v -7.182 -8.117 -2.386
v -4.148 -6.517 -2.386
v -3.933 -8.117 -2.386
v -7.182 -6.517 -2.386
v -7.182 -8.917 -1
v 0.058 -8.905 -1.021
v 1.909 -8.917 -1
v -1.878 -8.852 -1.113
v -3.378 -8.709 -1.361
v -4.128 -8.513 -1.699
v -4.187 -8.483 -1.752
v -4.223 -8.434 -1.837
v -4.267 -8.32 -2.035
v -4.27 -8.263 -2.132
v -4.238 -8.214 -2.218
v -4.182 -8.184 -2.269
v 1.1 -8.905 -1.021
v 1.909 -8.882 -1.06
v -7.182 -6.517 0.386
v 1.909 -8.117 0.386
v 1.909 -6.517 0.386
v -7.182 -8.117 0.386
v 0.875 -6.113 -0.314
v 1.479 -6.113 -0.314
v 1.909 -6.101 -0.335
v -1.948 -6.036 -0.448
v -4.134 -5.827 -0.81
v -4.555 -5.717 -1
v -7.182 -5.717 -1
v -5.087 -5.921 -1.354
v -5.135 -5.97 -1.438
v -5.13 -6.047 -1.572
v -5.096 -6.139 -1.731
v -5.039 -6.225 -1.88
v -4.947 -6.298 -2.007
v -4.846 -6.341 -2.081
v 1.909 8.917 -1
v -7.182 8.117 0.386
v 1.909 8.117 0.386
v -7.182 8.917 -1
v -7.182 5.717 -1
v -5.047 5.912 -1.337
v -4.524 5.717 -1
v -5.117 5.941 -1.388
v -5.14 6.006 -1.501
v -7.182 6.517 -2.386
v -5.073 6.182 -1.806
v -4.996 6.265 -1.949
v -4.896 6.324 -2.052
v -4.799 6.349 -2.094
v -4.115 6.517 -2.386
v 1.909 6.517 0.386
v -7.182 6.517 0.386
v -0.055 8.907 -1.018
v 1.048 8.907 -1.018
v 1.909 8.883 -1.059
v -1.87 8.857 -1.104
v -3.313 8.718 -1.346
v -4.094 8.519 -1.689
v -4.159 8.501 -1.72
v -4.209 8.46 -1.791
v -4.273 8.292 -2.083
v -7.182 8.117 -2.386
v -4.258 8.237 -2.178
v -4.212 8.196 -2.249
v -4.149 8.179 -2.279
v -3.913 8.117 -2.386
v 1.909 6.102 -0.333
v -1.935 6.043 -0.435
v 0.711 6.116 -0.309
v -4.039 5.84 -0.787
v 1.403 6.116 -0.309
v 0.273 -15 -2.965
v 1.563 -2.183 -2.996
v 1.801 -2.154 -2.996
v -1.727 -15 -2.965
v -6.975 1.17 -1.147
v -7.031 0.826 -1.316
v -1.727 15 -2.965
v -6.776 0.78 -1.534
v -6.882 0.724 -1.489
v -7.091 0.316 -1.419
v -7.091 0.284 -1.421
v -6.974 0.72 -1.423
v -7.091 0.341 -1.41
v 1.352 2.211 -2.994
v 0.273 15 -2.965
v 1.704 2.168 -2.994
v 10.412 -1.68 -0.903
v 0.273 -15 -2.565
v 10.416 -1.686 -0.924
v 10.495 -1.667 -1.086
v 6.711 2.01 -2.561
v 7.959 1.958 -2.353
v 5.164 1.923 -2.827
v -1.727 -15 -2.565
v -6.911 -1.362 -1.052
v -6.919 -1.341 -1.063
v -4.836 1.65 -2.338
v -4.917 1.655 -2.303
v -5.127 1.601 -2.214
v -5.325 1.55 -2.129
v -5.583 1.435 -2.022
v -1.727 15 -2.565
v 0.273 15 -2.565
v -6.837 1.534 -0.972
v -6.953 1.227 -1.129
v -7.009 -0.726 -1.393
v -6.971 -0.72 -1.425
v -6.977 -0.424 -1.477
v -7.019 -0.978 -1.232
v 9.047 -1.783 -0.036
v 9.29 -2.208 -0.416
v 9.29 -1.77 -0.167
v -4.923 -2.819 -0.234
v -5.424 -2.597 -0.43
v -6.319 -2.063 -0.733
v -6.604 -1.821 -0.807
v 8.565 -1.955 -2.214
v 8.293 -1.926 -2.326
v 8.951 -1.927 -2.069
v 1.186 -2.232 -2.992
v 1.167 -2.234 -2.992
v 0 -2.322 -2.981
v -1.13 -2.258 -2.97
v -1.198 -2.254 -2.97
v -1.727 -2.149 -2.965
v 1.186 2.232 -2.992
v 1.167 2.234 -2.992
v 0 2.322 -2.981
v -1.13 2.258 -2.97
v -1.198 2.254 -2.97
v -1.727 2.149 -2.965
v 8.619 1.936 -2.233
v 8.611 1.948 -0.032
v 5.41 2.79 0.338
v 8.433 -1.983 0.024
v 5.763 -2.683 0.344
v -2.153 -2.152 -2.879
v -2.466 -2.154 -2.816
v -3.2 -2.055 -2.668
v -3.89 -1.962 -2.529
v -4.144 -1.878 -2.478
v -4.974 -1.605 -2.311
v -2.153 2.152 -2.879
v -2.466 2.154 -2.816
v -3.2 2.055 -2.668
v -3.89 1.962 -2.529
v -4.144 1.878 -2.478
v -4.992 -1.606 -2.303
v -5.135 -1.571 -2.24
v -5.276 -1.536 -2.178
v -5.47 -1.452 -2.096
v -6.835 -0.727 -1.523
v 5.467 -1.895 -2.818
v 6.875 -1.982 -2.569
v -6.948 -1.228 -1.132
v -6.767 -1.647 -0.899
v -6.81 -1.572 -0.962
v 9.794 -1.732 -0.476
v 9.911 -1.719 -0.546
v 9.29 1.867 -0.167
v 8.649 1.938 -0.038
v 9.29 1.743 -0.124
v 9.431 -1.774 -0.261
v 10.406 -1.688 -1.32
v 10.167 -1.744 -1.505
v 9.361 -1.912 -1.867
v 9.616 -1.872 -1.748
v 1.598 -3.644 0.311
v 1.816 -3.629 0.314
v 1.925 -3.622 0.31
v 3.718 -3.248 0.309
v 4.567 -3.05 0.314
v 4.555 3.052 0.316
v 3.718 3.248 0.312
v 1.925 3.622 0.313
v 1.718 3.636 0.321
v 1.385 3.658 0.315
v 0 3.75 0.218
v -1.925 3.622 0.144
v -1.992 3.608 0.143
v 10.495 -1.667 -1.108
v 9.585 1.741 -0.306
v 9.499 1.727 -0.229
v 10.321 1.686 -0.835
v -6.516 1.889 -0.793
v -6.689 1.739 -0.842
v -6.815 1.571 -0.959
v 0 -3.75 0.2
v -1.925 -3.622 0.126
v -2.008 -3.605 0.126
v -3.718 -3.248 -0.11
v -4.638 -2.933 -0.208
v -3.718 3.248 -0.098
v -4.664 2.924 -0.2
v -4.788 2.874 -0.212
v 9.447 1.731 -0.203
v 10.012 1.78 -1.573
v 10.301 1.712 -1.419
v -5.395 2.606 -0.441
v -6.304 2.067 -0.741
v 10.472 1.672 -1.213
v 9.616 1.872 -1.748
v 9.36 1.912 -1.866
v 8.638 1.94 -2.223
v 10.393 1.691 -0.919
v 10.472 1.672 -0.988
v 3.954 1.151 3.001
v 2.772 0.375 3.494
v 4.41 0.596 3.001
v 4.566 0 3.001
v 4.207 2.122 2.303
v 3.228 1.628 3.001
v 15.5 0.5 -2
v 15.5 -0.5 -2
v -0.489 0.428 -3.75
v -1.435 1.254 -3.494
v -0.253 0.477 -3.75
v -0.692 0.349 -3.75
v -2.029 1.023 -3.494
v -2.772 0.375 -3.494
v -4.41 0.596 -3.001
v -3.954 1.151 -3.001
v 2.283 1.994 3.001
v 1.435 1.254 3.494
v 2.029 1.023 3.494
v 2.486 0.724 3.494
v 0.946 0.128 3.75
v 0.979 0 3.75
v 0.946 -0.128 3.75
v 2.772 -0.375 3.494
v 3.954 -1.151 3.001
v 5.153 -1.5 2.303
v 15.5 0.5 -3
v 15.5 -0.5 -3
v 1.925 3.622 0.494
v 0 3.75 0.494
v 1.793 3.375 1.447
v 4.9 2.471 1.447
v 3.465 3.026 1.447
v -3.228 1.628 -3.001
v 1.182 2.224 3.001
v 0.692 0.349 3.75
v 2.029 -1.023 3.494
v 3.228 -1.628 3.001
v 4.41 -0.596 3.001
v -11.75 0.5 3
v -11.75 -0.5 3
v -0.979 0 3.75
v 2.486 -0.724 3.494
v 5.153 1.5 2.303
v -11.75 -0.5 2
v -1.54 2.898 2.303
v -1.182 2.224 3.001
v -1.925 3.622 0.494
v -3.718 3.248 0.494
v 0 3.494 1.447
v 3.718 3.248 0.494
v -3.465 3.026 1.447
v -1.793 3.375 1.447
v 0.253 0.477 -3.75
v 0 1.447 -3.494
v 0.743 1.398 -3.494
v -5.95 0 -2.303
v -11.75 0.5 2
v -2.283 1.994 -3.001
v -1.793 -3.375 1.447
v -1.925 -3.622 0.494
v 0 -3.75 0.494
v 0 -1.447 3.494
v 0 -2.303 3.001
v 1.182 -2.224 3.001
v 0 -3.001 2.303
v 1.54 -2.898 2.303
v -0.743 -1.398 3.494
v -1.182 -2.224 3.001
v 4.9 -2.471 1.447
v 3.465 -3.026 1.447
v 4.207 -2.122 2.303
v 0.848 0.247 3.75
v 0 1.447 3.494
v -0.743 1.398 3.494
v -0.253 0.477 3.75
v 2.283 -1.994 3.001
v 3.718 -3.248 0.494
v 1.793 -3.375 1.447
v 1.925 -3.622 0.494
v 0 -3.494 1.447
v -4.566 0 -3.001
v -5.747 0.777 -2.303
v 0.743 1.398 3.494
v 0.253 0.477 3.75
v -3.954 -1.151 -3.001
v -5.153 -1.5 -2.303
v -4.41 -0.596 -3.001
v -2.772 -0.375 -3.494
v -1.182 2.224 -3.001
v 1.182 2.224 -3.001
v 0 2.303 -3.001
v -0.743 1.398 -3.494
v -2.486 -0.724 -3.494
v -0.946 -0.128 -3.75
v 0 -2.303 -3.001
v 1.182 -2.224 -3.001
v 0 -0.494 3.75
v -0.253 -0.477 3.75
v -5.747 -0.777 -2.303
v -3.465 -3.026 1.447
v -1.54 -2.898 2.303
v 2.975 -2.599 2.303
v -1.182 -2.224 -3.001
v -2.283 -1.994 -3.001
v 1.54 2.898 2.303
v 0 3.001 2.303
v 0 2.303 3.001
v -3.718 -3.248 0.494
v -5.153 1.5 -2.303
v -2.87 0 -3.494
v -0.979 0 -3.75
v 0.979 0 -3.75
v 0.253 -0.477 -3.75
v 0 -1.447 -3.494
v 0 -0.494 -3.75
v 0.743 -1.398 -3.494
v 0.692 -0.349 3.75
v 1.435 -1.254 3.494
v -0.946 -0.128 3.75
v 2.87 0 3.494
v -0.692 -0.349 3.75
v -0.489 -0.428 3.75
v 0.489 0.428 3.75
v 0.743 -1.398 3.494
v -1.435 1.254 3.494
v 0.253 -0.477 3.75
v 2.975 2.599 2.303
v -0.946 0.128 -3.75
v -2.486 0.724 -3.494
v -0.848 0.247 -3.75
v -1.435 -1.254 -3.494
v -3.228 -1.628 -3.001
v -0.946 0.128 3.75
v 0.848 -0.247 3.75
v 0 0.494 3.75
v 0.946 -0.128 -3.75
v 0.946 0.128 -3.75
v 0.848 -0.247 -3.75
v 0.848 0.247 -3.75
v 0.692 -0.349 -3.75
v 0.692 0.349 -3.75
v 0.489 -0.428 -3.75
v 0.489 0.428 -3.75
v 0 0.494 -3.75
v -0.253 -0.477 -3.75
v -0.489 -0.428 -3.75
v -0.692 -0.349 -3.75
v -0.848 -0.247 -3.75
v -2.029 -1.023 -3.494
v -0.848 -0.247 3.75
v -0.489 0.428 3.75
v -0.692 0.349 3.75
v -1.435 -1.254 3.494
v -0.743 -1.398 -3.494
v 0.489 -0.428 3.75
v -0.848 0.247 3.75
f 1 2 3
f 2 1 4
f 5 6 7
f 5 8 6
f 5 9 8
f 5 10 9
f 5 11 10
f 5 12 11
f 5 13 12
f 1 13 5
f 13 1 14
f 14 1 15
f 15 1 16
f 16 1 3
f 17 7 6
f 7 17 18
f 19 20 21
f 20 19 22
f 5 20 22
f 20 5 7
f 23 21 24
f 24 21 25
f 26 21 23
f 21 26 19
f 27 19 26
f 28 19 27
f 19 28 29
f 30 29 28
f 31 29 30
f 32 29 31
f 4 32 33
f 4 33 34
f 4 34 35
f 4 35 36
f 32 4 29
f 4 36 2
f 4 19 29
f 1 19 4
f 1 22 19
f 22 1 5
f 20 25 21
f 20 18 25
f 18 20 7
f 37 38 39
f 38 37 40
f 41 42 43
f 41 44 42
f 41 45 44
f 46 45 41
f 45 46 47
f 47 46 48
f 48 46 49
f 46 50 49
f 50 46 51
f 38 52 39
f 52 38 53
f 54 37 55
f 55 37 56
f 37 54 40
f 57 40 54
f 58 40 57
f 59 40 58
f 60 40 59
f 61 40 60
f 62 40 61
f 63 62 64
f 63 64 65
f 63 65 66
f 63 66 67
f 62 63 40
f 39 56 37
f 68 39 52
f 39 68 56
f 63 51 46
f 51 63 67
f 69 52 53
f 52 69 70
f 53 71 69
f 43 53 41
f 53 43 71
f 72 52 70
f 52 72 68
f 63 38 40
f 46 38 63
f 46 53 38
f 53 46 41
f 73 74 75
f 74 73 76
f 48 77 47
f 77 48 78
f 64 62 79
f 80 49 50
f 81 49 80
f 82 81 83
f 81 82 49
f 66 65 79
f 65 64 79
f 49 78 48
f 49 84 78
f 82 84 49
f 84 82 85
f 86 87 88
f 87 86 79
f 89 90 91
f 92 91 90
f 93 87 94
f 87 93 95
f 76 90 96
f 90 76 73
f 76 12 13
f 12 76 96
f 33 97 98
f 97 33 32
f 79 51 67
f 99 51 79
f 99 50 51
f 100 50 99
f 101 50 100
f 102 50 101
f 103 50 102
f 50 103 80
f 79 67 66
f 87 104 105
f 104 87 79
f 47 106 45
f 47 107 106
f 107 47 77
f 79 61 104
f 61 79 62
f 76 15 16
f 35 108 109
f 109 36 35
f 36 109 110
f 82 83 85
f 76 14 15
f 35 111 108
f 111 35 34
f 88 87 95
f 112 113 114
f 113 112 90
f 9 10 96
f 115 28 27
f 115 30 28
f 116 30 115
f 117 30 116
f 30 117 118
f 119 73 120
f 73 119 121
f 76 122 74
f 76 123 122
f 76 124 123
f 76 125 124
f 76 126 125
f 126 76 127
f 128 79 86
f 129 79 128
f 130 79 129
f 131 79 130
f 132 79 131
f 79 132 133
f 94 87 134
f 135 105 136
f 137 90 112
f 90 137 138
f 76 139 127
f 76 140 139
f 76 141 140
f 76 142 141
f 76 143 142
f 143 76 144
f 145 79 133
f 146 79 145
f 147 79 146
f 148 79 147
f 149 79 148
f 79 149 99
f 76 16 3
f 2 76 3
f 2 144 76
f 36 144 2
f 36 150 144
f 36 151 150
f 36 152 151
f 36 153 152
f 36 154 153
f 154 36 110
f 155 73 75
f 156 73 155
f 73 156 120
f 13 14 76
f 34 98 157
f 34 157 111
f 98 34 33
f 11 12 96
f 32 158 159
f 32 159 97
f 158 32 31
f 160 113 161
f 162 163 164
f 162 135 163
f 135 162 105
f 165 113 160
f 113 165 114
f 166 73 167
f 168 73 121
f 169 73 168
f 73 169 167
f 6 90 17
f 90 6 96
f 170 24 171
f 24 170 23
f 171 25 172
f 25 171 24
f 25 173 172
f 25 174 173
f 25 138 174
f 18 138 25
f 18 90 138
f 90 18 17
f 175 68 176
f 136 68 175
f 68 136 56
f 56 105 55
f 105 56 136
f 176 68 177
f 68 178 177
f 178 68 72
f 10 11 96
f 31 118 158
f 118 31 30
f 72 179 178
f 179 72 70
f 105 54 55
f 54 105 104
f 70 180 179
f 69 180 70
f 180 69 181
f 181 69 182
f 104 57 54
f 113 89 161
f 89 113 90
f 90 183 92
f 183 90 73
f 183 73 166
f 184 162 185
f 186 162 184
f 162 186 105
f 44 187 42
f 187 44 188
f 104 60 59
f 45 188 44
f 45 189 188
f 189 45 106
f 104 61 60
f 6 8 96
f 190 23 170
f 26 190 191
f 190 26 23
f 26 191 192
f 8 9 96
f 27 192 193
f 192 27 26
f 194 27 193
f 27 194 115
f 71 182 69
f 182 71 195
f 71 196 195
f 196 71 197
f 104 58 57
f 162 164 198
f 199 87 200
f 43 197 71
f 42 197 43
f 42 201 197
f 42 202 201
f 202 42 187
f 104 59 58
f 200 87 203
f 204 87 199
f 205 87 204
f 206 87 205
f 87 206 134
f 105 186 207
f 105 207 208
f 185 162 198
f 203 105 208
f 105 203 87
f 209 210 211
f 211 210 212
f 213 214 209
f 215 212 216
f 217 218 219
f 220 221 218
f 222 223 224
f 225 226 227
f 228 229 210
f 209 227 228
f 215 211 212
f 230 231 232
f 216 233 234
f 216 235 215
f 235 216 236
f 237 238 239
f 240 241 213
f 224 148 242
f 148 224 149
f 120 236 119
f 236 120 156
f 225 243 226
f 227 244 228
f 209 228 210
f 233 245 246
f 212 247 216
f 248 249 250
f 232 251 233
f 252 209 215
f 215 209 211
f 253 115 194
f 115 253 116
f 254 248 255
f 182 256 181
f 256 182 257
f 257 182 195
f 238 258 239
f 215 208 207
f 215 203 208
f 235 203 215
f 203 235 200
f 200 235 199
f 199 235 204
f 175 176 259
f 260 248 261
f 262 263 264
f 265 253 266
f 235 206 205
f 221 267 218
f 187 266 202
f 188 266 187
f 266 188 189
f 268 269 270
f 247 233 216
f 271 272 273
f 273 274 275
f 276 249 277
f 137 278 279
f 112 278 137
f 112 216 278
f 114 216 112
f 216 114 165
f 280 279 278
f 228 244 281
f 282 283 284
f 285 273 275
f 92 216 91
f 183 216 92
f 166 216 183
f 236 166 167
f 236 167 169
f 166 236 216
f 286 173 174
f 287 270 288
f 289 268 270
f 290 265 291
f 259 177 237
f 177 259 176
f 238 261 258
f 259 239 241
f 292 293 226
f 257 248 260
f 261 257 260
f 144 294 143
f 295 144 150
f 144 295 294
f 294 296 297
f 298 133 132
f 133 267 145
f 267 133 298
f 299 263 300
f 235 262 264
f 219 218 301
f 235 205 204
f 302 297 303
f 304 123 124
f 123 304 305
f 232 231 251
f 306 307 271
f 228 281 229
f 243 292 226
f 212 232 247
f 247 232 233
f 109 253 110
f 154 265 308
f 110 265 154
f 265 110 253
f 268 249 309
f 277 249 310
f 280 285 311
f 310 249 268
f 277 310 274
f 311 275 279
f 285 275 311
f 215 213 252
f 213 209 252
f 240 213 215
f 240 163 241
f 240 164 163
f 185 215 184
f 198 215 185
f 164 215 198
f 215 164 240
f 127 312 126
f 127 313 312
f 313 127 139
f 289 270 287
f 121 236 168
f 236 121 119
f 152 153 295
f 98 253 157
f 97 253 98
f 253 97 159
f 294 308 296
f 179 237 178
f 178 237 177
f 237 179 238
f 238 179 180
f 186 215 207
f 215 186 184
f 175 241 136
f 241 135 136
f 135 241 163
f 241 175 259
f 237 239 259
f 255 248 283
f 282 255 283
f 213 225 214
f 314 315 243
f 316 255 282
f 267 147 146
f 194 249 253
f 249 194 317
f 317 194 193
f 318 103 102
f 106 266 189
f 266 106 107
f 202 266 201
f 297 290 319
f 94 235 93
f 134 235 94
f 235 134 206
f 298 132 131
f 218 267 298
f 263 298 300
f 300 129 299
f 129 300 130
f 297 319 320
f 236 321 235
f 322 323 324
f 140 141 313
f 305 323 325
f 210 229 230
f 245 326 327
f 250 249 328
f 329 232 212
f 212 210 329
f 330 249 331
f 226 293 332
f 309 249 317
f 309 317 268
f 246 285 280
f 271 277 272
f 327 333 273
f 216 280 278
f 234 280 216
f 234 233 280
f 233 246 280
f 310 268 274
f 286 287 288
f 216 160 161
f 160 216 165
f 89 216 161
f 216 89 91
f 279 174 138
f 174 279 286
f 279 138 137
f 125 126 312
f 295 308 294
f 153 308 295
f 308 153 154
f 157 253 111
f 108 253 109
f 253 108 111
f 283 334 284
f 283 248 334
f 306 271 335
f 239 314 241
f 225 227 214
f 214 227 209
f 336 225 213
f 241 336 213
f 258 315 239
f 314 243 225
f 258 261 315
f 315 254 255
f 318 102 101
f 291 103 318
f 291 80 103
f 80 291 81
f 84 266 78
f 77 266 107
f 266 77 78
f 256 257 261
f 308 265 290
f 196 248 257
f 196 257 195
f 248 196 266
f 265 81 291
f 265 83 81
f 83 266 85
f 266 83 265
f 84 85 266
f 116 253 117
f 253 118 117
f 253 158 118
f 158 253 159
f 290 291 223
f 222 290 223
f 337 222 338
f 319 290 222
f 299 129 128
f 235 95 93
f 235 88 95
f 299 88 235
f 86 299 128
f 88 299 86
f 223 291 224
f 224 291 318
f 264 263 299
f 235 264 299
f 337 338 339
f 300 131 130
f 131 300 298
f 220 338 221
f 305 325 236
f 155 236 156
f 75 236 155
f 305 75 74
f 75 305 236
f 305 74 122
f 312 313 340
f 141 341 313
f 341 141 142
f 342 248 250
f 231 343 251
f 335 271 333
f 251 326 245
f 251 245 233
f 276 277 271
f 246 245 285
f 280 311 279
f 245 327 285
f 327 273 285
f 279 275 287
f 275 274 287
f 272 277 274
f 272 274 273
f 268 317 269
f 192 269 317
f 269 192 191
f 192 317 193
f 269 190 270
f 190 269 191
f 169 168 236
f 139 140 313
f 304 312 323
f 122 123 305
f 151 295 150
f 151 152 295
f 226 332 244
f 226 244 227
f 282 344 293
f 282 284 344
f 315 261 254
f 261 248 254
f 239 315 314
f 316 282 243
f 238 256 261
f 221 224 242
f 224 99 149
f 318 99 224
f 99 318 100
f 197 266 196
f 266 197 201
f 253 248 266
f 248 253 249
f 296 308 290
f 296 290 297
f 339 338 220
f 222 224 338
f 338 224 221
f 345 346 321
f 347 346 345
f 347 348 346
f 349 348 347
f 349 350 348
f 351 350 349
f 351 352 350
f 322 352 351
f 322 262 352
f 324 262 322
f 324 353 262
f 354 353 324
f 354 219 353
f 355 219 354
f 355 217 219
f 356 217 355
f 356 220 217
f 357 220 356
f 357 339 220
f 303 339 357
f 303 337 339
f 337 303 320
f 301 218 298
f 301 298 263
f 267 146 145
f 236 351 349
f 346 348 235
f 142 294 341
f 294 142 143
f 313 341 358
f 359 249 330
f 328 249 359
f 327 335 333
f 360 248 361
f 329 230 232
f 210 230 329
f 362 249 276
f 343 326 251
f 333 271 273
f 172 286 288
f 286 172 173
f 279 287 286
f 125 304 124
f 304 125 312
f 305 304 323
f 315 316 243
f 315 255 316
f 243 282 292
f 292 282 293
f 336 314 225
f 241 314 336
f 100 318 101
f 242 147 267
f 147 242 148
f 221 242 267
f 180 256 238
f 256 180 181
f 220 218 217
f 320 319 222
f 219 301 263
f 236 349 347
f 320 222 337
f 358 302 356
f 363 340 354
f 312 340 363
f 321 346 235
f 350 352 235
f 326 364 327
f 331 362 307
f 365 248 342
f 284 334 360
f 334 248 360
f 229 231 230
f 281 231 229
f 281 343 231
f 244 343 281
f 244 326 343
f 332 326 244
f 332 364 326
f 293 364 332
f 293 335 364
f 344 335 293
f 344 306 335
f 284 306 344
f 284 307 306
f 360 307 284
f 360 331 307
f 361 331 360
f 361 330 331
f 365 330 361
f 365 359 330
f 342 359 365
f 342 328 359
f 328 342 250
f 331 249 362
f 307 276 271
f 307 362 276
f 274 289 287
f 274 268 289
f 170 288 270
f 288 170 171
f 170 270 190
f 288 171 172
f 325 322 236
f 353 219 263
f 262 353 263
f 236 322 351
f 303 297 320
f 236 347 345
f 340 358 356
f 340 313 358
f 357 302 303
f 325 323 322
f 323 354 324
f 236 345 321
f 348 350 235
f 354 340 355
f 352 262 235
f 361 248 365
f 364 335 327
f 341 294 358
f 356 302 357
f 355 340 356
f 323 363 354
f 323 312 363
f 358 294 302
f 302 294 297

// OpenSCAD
module enginePylon(a, l, r) {
	//translate([0, -2, 0]) cube([l, 4, 8], false);
	resize(newsize=[0.85*l, l/3.5, 0.5*l]) rotate([0, 90, 0]) cylinder(0.85*l, 4, 4,false);
	rotate([0, a, 0]) translate([0.85*l-1, 0, a/6]) engine(r, l);
}

module engine(r, l) {
	cylinder(l, r, r, true);
}

module deltaType(s, t, a, sw, e) {
/*
s= span
t= thickness
a= aspect ratio (0<x)
sw= wing sweep (0-1)
e= number of engines
*/
	//body
	l = s/a;
	hull() {
		resize(newsize=[0, t, l]) sphere(t);
		//"wings"
		translate([0, -s/17, l*(sw-.5)]) cube([s, t/10, 2], true);
	}
	//engines
	r = s/(2*e);
	if (floor(e/2) != ceil(e/2)) translate([0, 0, l/3]) engine(r, l/3);
	for (i=[0:1]) {
		for (k=[1:1:(e/2)]) {
			rotate([0, 0, i*(180)]) 
				translate([k*s/(2.05*e), 0  , (+l/2)-(k/(e+1))*2.1*(1-sw)*l]) 
					engine(min(t/2.5,(k+1)*r/(2*k)), l/2);
		}
	}
}
module radialType(p, r, l, a, re) {
    /*
p = number of pylons
r = main body radius
l = length
a = wing/pylon sweep 0-40 deg
re = engine radius
*/
	//body
	hull() {
		sphere(r);
		translate([0, 0, l-1.5*r]) sphere(r/2);
	}
	//pylons
	for (i=[0:p]) {
		rotate([0, -a, i*(360/p)])
            translate([(r/2)-1, 0, l/3])
                enginePylon(a, l/2, re);
	}
}
module fighterHull(scale) {
    r=scale*3;
        hull() {
            resize(newsize=[0, r, r]) sphere(r);
            translate([2*r,0,-scale]) cube([scale], true);
            translate([-1.5*r,0,scale]) cube([scale], true);
        };
    }
module displayShips(s, sp) {
// display code
for (i=[0.9:0.16:2]) {
	for (k=[0.25:0.15:0.75]) {
		for (j=[1:1:7]) {
			translate([sp*(i-0.9)*10*s, (sp*j)*s, -sp*(0.25-k)*10*s]) deltaType(s, s/4, i, k, j);
		}
	}
}

for (i=[5:5:35]) {
	for (k=[10:5:25]) {
		for (j=[2:7]) {
			translate([sp*(i-5)*30, -sp*(j-1)*150, -sp*(10-k)*30]) radialType(j, k, s, i);
		}
	}
}
}
module rocketType(l, t, f, e) {}
module moduleType() {}
module splitType() {}

fighterHull(2.5);
translate([2, 0, -1]) rotate([90,0,-90]) deltaType(30, 4, 1.65, 0.65, 2);
